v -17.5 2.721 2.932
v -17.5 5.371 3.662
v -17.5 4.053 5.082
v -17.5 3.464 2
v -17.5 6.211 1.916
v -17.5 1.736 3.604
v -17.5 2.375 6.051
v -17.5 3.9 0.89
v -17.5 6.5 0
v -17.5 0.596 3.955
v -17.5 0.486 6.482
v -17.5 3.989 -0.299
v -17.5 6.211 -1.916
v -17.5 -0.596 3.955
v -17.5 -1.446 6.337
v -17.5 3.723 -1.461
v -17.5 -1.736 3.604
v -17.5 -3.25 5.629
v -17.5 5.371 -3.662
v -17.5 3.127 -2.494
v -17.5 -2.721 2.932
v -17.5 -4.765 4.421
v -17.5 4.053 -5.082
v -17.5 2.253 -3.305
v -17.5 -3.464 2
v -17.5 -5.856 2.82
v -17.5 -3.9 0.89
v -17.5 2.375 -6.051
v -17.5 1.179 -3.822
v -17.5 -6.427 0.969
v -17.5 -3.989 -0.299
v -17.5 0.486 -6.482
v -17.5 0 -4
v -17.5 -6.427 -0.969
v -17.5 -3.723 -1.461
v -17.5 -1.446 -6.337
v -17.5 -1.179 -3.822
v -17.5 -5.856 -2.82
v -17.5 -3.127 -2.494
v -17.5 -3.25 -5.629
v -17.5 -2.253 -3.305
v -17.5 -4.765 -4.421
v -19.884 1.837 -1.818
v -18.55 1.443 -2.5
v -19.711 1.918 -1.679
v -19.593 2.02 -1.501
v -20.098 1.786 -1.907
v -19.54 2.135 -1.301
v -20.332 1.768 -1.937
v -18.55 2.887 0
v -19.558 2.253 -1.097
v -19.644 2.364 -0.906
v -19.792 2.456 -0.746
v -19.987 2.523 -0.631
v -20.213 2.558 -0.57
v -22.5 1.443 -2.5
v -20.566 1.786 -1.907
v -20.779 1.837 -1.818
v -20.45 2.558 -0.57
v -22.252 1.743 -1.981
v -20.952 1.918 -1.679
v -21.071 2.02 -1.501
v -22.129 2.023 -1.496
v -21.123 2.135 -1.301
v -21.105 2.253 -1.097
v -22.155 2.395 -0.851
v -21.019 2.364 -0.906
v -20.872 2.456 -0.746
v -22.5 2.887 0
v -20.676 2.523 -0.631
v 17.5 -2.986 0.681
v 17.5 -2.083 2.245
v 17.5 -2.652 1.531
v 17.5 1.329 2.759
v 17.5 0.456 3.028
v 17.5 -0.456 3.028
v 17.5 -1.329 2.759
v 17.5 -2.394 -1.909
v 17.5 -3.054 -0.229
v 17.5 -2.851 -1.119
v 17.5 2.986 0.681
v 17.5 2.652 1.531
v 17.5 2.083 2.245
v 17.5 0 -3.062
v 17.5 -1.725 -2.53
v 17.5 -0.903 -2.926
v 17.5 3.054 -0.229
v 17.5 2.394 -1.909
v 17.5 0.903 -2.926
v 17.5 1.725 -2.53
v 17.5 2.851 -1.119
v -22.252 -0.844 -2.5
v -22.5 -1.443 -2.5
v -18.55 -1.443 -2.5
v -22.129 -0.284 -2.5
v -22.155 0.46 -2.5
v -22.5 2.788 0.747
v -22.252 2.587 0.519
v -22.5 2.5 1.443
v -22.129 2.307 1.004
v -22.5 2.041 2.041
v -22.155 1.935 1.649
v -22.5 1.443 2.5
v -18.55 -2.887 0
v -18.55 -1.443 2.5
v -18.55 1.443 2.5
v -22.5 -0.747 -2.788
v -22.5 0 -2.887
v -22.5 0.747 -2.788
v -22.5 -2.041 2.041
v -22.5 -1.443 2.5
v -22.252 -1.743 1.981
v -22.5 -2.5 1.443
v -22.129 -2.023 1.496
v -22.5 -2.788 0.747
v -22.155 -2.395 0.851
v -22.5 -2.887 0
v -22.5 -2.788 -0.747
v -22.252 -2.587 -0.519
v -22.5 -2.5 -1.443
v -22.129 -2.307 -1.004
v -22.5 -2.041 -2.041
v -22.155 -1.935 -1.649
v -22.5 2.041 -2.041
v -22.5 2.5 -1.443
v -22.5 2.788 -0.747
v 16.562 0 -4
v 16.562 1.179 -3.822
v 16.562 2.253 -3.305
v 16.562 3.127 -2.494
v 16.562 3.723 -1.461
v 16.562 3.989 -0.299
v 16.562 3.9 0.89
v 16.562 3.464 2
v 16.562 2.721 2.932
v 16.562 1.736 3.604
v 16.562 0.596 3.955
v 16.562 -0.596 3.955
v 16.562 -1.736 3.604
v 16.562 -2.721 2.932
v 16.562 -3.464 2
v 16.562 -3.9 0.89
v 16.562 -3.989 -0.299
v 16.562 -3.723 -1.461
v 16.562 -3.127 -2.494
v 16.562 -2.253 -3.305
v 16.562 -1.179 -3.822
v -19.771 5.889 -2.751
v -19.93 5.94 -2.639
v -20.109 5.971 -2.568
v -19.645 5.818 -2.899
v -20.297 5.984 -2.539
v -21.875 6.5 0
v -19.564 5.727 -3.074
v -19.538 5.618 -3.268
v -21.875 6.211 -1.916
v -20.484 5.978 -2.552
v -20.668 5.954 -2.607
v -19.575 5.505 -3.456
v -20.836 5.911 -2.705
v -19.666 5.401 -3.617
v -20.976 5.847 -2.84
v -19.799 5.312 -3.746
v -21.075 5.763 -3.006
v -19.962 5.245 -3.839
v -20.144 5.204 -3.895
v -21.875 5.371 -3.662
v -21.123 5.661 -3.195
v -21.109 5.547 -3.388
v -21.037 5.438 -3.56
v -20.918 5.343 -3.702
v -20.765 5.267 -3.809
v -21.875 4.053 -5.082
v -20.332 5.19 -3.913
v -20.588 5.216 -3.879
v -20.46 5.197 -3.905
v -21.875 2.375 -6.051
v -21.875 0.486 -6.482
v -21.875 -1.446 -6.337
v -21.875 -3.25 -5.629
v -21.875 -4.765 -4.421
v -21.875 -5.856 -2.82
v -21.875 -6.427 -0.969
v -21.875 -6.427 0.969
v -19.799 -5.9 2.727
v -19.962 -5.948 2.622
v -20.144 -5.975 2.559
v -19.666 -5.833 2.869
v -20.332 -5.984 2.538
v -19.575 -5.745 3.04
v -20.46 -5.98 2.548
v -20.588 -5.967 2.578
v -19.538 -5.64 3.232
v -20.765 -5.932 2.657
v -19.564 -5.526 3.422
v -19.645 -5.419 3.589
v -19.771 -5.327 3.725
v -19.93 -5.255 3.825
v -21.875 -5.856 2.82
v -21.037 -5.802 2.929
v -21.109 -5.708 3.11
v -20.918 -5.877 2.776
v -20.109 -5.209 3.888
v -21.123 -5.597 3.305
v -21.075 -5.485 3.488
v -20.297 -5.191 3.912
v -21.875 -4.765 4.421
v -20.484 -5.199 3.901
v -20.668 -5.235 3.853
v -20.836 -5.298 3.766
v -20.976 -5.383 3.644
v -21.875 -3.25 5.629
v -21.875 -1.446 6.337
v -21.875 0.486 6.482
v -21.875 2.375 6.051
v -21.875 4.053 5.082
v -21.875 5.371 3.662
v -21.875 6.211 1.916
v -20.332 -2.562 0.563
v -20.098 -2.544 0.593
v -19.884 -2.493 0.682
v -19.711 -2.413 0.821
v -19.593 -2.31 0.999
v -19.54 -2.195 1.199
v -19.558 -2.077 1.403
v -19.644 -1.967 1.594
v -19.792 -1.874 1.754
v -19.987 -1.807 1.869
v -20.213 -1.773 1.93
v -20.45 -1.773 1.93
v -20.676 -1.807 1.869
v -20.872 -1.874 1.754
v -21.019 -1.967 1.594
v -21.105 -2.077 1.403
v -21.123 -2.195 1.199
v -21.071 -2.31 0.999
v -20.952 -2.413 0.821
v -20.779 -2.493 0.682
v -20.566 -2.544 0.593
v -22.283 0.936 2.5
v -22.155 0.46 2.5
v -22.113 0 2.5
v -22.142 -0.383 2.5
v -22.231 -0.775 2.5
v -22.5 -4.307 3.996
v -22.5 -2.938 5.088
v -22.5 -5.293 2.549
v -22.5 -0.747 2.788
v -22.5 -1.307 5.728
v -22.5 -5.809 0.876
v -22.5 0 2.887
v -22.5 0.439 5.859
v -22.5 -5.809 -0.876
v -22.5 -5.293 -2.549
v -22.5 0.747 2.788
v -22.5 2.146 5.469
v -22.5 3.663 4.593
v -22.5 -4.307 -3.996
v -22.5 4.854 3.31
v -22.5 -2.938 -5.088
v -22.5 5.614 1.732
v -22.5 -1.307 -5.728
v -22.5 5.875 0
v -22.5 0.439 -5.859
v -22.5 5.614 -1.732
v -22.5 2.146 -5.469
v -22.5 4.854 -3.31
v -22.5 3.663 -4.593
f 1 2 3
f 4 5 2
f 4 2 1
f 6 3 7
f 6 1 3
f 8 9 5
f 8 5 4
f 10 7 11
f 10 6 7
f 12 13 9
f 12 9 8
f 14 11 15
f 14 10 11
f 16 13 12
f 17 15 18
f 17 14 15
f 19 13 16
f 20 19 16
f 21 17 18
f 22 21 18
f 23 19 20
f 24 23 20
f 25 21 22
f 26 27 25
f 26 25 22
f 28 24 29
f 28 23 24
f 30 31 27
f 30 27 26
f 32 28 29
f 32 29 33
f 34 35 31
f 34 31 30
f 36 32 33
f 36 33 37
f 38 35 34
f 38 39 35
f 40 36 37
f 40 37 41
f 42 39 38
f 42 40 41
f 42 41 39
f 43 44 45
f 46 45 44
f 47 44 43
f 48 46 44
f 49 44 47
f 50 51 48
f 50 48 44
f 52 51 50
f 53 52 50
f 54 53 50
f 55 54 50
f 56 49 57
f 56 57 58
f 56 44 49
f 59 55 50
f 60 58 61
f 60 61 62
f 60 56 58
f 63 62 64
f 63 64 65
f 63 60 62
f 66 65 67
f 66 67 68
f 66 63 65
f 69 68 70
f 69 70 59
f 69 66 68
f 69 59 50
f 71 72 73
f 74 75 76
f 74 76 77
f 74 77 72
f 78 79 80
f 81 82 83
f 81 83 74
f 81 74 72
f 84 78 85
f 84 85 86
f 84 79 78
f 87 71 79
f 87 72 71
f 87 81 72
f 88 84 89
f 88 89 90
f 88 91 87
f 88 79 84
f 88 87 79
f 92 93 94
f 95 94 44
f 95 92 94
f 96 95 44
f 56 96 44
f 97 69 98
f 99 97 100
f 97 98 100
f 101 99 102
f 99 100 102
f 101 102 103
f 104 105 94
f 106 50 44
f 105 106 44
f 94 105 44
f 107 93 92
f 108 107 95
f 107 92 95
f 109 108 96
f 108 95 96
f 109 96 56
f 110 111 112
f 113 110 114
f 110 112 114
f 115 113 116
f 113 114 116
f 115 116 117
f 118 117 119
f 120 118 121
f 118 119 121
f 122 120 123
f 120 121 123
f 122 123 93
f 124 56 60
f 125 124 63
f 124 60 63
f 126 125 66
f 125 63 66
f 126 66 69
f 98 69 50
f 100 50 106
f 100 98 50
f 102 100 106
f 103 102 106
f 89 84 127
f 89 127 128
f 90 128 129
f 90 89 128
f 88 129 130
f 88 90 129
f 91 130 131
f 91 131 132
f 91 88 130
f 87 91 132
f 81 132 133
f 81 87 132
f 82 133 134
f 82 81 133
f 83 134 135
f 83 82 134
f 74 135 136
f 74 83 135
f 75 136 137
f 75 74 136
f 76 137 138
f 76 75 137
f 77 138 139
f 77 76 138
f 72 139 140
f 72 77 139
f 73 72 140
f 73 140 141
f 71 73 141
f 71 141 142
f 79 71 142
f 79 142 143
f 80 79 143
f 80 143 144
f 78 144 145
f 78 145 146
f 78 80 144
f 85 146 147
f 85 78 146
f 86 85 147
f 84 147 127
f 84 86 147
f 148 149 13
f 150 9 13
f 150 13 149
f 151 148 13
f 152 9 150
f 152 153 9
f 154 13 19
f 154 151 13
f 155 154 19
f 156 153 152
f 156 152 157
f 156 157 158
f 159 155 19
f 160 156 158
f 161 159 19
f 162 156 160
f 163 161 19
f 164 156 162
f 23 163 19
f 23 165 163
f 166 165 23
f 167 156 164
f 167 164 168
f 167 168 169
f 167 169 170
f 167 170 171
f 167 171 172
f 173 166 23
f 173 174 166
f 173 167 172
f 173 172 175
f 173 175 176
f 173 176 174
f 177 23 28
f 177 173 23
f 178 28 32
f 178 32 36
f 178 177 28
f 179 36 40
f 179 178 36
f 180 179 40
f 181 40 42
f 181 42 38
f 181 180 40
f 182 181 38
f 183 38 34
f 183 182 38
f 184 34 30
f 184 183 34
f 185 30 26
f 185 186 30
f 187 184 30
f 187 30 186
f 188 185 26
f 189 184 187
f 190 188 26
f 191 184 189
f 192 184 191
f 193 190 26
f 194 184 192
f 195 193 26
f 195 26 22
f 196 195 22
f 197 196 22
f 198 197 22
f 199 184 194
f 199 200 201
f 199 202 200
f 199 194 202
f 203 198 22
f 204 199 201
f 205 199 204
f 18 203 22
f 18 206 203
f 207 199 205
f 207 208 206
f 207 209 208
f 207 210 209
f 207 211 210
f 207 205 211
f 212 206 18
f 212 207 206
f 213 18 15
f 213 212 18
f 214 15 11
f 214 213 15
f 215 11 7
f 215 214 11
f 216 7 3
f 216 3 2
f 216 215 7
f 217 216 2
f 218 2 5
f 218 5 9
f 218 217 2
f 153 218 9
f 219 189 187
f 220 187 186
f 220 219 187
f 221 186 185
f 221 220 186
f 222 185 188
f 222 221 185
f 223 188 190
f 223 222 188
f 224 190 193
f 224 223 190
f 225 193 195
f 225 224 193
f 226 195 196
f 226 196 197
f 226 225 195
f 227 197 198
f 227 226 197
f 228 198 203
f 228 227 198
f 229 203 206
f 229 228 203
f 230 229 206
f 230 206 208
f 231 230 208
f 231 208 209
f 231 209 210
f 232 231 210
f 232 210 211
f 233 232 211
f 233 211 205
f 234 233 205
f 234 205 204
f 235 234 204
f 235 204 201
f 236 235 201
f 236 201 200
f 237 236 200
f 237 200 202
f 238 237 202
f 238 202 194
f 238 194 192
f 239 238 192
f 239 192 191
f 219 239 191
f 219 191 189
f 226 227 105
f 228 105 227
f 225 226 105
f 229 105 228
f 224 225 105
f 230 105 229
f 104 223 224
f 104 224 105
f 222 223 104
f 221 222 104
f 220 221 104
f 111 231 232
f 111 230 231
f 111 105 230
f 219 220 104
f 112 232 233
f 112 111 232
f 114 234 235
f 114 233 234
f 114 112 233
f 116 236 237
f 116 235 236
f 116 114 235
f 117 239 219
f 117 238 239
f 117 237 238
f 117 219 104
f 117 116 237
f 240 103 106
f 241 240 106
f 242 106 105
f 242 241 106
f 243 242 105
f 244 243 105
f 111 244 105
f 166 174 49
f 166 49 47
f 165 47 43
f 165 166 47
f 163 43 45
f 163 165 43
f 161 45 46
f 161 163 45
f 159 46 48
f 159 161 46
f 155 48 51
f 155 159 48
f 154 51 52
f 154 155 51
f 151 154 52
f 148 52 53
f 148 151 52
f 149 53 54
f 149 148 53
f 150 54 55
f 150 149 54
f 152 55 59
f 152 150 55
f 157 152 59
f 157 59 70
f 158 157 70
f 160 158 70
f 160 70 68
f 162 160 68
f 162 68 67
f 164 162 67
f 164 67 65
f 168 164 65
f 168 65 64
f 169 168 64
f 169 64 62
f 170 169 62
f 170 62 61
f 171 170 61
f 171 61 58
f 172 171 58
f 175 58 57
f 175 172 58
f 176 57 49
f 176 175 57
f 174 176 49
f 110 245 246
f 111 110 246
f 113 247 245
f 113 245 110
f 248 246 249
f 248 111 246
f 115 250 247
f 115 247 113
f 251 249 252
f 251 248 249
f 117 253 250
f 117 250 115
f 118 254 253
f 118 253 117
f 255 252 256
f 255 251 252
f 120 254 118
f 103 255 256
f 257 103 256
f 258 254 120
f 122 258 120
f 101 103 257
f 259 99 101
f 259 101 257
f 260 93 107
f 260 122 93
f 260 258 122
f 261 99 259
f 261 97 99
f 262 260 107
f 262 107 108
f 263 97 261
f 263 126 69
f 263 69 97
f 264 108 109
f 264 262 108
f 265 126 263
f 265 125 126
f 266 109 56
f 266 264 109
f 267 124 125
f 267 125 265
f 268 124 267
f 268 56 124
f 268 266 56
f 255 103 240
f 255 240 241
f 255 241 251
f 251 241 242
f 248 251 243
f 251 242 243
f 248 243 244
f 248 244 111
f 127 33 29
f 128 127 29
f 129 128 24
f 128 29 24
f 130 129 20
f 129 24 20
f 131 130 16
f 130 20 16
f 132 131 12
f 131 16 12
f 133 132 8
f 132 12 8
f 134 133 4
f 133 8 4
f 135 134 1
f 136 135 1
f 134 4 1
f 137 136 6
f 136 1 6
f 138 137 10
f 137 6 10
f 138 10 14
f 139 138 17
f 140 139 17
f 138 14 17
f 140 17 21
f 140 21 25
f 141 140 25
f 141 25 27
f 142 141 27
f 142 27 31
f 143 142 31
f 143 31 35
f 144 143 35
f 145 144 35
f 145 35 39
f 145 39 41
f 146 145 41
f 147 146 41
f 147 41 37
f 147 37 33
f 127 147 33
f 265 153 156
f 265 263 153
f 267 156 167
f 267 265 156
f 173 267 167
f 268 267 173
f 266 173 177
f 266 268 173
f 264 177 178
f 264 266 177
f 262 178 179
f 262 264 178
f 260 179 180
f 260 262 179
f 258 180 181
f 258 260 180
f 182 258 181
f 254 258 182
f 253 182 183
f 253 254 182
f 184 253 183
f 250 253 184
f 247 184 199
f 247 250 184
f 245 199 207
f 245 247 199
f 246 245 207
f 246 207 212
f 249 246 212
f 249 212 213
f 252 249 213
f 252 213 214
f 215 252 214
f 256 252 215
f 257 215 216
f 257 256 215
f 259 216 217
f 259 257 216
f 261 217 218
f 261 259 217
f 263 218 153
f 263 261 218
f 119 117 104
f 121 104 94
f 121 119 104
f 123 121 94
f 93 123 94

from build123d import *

# Parameters (mm, degrees)
SKETCH2_R               = 4
BOSS_EXTRUDE1_DEPTH     = 22
CHAMFER1_SIZE           = 0.9375
CUT_EXTRUDE1_DEPTH      = 3.95
CUT_EXTRUDE3_DEPTH      = 26.325793682
CUT_EXTRUDE3_DEPTH_BACK = 26.325793682
SKETCH11_R              = 0.79375


with BuildPart() as part:
    # Sketch2 → Boss-Extrude1 (new body)
    with BuildSketch(Plane(origin=(17.5, 0, 0), x_dir=(0, 0, -1), z_dir=(1, 0, 0))):
        Circle(SKETCH2_R)
    extrude(amount=-BOSS_EXTRUDE1_DEPTH)

    # Chamfer1
    chamfer1_edges = [part.edges().sort_by_distance(p)[0] for p in [
        (17.5, 0, 4),
    ]]
    chamfer(chamfer1_edges, length=CHAMFER1_SIZE)

    # Sketch10 → Revolve2 (revolve)
    with BuildSketch(Plane.XY, mode=Mode.PRIVATE) as revolve2_sk:
        Polygon((-2.190598923, 0), (-4.5, 4), (-17.5, 4), (-17.5, 0), align=None)
    revolve(revolve2_sk.sketch.rotate(Axis((-17.5, 0, 0), (1, 0, 0)), 270), axis=Axis((-17.5, 0, 0), (1, 0, 0)))

    # Sketch6 → Revolve1 (revolve)
    with BuildSketch(Plane.XY):
        Polygon((-21.875, 6.5), (-22.5, 5.875), (-22.5, 0), (-17.5, 0), (-17.5, 6.5), align=None)
    revolve(axis=Axis((-17.5, 0, 0), (-1, 0, 0)))

    # Sketch4 → Cut-Extrude1 (cut)
    with BuildSketch(Plane(origin=(-22.5, 0, 0), x_dir=(0, 0, -1), z_dir=(1, 0, 0))):
        Polygon((0, 2.886751346), (-2.5, 1.443375673), (-2.5, -1.443375673), (0, -2.886751346), (2.5, -1.443375673), (2.5, 1.443375673), align=None)
    extrude(amount=CUT_EXTRUDE1_DEPTH, mode=Mode.SUBTRACT)

    # Cut-Extrude2 cone 1 section (through the dimple's axis) → Cut-Extrude2 (revolve, cut)
    with BuildSketch(Plane(origin=(-22.5, 0, 0), x_dir=(0, 0, 1), z_dir=(0, 1, 0))):
        Polygon((0, 0), (2.886751346, 0), (0, 2.886751346), align=None)
    revolve(axis=Axis((-22.5, 0, 0), (1, 0, 0)), mode=Mode.SUBTRACT)

    # Sketch11 → Cut-Extrude3 (cut, two sides: drawn at the far end of the back side and taken through both)
    with BuildSketch(Plane(origin=(0, 2.165063509, -1.25), x_dir=(1, 0, 0), z_dir=(0, -0.8660254037844387, 0.49999999999999994)).offset(-CUT_EXTRUDE3_DEPTH_BACK)):
        with Locations(Location((-20.331624369, 0, 0), (0, 0, 270))):
            Circle(SKETCH11_R)
    extrude(amount=CUT_EXTRUDE3_DEPTH + CUT_EXTRUDE3_DEPTH_BACK, mode=Mode.SUBTRACT)


solid = part.part
